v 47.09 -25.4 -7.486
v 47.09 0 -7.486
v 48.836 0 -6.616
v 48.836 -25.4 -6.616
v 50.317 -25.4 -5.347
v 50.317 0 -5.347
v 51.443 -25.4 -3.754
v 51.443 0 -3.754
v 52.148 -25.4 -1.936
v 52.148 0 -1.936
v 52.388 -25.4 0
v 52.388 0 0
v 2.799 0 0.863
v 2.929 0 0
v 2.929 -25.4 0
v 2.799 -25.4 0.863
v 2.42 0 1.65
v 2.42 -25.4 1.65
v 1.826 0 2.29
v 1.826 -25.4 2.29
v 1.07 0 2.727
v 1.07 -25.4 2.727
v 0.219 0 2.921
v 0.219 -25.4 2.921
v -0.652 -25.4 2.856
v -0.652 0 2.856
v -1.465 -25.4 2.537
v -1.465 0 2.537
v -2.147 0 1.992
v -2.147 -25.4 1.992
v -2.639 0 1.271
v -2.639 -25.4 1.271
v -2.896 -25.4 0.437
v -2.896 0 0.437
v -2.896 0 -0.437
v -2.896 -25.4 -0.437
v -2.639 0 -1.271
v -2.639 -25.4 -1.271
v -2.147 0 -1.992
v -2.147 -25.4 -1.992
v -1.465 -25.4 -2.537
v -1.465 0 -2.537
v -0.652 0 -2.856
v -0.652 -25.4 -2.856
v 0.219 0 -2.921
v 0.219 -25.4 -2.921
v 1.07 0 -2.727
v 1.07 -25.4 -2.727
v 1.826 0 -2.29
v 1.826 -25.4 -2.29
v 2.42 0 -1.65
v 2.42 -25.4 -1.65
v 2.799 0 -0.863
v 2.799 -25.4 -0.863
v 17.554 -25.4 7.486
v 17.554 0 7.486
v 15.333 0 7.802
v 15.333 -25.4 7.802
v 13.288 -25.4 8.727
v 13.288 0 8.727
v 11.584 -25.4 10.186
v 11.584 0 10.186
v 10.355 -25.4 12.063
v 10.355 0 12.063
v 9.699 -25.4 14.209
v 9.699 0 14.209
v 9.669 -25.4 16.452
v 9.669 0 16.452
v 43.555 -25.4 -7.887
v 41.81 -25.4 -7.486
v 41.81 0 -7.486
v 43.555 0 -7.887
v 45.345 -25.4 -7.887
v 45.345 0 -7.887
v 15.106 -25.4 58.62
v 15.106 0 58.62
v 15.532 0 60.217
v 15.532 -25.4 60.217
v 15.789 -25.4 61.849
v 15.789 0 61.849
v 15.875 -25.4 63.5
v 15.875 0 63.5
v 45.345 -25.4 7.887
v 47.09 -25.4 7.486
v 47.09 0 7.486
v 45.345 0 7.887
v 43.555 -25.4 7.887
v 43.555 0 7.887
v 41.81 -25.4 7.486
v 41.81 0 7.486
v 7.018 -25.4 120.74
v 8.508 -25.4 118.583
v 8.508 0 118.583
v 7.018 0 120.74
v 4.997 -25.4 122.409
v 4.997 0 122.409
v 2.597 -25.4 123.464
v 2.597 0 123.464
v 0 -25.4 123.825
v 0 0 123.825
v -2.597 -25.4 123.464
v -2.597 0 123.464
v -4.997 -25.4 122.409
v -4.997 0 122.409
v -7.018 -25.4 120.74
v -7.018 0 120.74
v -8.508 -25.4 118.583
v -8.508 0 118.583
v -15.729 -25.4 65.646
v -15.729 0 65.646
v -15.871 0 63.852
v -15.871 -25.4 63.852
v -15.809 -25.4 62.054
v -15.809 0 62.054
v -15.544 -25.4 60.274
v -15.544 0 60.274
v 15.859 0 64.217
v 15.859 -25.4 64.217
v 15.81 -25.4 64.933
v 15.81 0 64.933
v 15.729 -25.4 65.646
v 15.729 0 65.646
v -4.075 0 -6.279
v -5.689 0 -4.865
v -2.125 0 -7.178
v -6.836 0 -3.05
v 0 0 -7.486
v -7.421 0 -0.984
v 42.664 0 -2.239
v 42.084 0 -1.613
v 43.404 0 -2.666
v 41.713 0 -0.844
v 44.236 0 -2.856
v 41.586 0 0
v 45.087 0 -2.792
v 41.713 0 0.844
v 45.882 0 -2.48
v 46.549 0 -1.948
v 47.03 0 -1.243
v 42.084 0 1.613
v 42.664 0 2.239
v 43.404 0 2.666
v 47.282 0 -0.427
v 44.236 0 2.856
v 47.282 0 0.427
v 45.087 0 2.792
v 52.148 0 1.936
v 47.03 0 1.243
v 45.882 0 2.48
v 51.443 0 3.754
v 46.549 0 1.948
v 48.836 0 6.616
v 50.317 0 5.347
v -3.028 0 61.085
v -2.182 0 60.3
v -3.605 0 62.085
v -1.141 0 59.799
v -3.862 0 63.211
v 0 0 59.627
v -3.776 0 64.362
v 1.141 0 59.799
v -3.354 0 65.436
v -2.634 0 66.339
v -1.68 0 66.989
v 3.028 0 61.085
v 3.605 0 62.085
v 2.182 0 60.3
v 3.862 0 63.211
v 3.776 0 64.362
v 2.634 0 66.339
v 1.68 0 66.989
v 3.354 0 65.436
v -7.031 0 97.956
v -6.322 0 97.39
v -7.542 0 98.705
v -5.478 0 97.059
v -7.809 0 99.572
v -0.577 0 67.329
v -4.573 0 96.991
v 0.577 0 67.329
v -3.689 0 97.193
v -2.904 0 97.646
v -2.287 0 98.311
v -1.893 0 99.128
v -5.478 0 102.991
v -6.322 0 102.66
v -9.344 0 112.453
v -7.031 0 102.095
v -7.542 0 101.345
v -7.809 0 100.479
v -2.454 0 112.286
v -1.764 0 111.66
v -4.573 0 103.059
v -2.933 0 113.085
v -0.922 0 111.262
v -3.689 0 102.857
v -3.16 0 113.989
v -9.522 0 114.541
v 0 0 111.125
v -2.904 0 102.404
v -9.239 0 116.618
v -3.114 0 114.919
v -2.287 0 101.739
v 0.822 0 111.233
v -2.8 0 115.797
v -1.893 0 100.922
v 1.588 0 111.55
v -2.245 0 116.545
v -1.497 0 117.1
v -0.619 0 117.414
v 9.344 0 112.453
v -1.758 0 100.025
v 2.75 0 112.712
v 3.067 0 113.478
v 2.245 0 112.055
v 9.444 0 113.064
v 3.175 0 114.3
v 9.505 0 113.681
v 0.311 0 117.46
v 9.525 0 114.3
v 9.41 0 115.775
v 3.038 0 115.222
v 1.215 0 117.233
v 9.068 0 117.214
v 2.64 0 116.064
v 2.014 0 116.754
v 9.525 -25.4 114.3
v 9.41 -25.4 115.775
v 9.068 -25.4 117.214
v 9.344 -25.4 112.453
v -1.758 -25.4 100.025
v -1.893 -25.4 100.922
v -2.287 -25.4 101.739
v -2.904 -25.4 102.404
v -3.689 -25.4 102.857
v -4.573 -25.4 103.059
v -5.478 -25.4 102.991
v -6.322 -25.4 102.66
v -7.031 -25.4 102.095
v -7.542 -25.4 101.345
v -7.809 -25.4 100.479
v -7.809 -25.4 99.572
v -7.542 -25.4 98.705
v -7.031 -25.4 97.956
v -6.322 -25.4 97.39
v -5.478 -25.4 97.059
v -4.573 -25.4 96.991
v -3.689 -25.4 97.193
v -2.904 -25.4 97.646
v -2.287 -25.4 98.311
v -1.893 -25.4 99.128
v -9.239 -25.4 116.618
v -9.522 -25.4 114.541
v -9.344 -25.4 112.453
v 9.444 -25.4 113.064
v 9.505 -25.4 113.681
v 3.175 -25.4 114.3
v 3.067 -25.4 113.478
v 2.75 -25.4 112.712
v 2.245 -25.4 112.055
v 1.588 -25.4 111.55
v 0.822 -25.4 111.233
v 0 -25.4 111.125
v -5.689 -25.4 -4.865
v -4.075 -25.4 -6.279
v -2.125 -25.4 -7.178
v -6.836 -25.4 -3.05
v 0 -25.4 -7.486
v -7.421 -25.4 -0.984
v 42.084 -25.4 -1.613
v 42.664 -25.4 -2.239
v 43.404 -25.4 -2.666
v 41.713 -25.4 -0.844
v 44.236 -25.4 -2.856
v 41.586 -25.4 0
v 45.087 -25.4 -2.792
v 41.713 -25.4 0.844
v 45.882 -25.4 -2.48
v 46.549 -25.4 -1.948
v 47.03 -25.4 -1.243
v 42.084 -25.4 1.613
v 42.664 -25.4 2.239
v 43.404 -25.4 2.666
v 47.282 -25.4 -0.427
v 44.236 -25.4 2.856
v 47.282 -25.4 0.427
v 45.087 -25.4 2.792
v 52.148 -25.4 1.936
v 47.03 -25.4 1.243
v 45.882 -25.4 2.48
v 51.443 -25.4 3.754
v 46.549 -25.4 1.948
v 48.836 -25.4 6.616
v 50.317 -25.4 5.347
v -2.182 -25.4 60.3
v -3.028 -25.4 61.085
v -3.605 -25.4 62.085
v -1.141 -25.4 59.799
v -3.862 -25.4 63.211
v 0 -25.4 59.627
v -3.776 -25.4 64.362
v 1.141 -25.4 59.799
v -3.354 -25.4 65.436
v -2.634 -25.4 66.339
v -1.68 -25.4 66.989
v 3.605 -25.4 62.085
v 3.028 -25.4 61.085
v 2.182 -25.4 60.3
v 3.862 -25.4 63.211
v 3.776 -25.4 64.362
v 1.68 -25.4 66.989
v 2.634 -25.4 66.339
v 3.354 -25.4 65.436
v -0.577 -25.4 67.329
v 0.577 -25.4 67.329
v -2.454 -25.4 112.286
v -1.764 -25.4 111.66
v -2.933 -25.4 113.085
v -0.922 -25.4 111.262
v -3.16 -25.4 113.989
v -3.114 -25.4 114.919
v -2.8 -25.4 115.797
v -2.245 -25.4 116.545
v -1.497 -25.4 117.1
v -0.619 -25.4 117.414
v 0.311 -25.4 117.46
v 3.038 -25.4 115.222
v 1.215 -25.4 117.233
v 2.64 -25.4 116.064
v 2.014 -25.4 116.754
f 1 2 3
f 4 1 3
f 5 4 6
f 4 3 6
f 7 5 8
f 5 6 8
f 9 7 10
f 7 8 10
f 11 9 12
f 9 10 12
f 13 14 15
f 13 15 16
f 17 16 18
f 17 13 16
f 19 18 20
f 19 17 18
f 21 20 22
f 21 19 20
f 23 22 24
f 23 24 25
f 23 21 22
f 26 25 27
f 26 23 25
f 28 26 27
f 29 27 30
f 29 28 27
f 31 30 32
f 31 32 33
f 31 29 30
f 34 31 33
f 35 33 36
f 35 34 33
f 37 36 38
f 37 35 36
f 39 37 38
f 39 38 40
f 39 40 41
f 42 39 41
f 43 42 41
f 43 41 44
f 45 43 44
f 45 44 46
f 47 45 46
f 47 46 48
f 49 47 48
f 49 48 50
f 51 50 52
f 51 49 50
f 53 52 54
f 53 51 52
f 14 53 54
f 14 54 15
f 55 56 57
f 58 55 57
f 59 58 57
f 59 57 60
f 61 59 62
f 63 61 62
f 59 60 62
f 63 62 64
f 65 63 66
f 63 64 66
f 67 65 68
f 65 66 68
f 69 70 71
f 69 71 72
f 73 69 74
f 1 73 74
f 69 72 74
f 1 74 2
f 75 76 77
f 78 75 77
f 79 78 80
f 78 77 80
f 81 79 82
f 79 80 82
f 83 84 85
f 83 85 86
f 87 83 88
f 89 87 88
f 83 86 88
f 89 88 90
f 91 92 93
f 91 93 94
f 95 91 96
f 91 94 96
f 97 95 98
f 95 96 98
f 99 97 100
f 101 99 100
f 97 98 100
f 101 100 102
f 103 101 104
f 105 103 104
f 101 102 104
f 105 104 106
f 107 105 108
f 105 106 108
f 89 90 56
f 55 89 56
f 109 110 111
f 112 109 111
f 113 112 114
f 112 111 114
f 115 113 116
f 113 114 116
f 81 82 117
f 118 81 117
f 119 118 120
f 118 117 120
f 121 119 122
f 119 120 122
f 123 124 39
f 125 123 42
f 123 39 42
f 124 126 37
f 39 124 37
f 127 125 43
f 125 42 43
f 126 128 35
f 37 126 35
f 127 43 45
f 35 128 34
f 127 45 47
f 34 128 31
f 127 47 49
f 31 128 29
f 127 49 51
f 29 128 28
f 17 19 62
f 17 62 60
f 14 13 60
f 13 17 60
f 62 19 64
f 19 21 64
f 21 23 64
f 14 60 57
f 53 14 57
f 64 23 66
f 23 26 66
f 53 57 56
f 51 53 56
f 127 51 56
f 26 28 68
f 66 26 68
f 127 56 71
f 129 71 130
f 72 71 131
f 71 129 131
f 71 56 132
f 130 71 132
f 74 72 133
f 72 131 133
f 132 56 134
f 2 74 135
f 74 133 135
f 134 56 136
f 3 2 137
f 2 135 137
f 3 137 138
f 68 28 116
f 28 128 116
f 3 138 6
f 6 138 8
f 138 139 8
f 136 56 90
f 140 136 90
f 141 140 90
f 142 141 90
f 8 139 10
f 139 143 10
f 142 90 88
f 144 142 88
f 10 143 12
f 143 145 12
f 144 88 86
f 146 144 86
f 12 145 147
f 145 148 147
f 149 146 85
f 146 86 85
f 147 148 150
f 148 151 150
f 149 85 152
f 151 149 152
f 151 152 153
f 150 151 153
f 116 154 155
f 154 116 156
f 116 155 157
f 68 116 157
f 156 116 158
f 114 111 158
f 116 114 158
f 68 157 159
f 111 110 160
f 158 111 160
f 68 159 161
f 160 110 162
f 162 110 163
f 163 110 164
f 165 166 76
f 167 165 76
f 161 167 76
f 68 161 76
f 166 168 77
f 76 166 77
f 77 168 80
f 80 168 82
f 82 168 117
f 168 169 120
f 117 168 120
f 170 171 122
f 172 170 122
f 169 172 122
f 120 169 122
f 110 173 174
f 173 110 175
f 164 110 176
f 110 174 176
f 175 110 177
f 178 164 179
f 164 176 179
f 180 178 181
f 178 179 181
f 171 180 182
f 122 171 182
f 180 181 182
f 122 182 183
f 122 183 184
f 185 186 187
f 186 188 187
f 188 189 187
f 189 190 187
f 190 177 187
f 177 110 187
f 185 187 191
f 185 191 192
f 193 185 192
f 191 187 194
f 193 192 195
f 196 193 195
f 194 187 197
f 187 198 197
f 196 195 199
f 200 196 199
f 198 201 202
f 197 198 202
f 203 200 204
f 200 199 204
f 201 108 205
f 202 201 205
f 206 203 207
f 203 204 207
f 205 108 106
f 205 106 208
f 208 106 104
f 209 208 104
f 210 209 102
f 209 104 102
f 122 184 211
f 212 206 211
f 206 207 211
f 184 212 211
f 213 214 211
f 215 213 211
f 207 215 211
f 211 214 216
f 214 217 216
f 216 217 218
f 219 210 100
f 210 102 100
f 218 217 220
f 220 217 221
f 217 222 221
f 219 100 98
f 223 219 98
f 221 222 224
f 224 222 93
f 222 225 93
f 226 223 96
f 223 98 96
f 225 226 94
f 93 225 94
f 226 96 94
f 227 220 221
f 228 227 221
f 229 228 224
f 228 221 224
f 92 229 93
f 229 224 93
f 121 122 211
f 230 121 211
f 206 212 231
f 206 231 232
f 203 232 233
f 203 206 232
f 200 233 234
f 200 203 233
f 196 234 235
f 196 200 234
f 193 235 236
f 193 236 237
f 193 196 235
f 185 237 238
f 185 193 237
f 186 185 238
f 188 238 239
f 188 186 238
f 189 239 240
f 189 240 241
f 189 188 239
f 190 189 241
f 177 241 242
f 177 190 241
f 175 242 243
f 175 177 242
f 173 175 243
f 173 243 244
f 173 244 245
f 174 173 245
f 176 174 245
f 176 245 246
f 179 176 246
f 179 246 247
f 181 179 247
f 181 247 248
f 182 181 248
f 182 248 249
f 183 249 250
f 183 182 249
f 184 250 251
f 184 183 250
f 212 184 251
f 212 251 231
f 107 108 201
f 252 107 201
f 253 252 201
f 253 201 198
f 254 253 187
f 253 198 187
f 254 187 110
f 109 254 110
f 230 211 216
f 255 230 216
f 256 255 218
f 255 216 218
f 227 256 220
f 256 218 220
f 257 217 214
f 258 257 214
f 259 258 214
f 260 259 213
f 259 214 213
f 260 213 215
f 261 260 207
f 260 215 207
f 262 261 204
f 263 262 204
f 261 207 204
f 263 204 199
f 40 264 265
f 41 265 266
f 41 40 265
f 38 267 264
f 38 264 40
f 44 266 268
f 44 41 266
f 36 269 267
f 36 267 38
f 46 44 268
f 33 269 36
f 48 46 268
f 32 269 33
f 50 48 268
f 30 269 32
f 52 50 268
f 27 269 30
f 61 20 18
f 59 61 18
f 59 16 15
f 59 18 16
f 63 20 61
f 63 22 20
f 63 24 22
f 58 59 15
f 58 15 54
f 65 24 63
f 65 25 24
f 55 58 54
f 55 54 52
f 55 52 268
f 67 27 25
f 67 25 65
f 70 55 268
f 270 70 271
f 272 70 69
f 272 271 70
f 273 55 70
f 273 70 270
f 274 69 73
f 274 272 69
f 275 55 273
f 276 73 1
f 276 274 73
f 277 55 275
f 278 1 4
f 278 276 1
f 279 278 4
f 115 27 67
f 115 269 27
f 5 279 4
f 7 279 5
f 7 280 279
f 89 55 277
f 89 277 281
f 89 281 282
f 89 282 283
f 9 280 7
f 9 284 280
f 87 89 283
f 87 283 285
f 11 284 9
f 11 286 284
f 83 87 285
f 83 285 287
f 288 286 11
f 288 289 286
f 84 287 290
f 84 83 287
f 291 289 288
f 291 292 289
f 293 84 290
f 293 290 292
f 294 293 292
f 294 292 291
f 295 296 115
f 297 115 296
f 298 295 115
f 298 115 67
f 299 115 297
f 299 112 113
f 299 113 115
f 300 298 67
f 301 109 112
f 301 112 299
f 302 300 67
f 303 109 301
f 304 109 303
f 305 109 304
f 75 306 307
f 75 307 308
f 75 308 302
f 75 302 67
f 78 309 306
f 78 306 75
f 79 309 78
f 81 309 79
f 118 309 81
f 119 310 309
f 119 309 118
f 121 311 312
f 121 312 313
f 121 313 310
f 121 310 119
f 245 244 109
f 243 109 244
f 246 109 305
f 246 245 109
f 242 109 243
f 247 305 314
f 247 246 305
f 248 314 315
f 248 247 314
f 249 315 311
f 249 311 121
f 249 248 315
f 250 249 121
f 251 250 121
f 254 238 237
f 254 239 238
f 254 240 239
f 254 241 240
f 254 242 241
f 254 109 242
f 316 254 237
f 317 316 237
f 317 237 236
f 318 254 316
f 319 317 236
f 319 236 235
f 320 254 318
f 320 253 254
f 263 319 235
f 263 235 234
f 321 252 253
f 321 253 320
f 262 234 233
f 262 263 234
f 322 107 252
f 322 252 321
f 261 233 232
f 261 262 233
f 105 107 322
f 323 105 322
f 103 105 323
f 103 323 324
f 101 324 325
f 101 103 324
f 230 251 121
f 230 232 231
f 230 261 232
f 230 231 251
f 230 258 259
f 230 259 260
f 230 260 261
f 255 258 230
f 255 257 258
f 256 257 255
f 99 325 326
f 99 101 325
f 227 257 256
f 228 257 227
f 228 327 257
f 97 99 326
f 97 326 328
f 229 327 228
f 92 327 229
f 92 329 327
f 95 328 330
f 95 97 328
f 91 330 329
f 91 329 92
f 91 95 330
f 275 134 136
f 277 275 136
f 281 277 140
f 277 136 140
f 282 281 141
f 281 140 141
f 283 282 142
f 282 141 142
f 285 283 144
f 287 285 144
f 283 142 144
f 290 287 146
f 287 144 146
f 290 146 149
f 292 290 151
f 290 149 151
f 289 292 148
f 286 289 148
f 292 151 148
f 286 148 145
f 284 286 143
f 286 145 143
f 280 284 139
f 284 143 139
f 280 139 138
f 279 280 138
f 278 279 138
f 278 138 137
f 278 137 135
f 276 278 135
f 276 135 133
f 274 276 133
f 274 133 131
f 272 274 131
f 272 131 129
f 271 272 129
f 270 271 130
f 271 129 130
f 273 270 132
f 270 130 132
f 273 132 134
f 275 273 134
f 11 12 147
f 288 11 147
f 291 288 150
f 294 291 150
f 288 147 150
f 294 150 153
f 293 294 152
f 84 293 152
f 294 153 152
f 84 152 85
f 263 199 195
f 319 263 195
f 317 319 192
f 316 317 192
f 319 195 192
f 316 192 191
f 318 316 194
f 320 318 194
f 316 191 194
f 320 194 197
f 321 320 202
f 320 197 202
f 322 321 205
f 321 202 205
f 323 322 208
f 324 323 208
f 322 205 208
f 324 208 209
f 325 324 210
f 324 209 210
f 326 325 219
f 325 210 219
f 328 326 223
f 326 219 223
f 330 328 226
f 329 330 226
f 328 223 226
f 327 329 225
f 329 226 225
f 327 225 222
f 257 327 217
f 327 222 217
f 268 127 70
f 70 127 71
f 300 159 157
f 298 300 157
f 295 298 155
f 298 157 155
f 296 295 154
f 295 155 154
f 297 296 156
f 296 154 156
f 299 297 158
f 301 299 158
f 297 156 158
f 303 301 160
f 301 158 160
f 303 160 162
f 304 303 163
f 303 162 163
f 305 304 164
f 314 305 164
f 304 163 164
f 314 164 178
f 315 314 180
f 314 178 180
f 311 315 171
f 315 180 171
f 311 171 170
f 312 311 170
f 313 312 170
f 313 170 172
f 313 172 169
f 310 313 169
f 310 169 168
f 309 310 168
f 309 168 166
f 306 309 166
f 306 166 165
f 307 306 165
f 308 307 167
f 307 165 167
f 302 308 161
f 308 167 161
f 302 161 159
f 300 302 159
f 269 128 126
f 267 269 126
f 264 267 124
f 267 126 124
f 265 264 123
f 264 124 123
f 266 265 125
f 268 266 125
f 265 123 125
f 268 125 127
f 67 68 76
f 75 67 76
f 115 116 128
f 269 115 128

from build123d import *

# Parameters (mm, degrees)
F0_R     = 3.0424971204
F0_R_2   = 2.9292036199
F1_DEPTH = 25.4
F2_DEPTH = 25.4


with BuildPart() as f1:
    # F0 (on Front) → F1 (new body)
    with BuildSketch(Plane.XZ):
        with BuildLine():
            ThreePointArc((-9.3441255469, 112.4525848425), (-6.0468585077, 106.9405756212), (0, 104.775))
            ThreePointArc((0, 104.775), (6.0468585077, 106.9405756212), (9.3441255469, 112.4525848425))
            Line((9.3441255469, 112.4525848425), (8.5078797675, 118.5827102238))
            ThreePointArc((8.5078797675, 118.5827102238), (0, 123.825), (-8.5078797675, 118.5827102238))
            Line((-8.5078797675, 118.5827102238), (-9.3441255469, 112.4525848425))
        make_face()
        with BuildLine():
            ThreePointArc((3.175, 114.3), (2.2450640303, 112.0549359697), (0, 111.125))
            ThreePointArc((0, 111.125), (-2.2450640303, 116.5450640303), (3.175, 114.3))
        make_face(mode=Mode.SUBTRACT)
        with BuildLine():
            ThreePointArc((9.3441255469, 112.4525848425), (6.0468585077, 106.9405756212), (0, 104.775))
            Line((0, 104.775), (0, 79.375))
            ThreePointArc((0, 79.375), (10.4391619832, 75.4599131304), (15.7293191148, 65.6457271922))
            Line((15.7293191148, 65.6457271922), (9.3441255469, 112.4525848425))
        make_face()
        with BuildLine():
            Line((0, 79.375), (0, 104.775))
            ThreePointArc((0, 104.775), (-6.0468585077, 106.9405756212), (-9.3441255469, 112.4525848425))
            Line((-9.3441255469, 112.4525848425), (-15.7293191148, 65.6457271922))
            ThreePointArc((-15.7293191148, 65.6457271922), (-10.4391619832, 75.4599131304), (0, 79.375))
        make_face()
        with Locations((-4.8008062877, 100.0252)):
            Circle(F0_R, mode=Mode.SUBTRACT)
        with BuildLine():
            ThreePointArc((15.7293191148, 65.6457271922), (10.4391619832, 75.4599131304), (0, 79.375))
            Line((0, 79.375), (0, 67.372643786))
            ThreePointArc((0, 67.372643786), (2.7383726822, 66.2383726822), (3.872643786, 63.5))
            ThreePointArc((3.872643786, 63.5), (2.7383726822, 60.7616273178), (0, 59.627356214))
            Line((0, 59.627356214), (0, 47.625))
            ThreePointArc((0, 47.625), (9.3418966112, 50.664712987), (15.1062581732, 58.619775722))
            ThreePointArc((15.1062581732, 58.619775722), (15.6816369283, 61.0297999575), (15.875, 63.5))
            ThreePointArc((15.875, 63.5), (15.8385379052, 64.5753334487), (15.7293191148, 65.6457271922))
        make_face()
        with BuildLine():
            Line((0, 67.372643786), (0, 79.375))
            ThreePointArc((0, 79.375), (-10.4391619832, 75.4599131304), (-15.7293191148, 65.6457271922))
            ThreePointArc((-15.7293191148, 65.6457271922), (-15.8655379037, 62.9519744291), (-15.5437709654, 60.2740413558))
            ThreePointArc((-15.5437709654, 60.2740413558), (-10.0200681516, 51.1868420282), (0, 47.625))
            Line((0, 47.625), (0, 59.627356214))
            ThreePointArc((0, 59.627356214), (-3.872643786, 63.5), (0, 67.372643786))
        make_face()
        with BuildLine():
            ThreePointArc((-8.5078797675, 118.5827102238), (-9.4375914689, 115.5874363153), (-9.3441255469, 112.4525848425))
            Line((-9.3441255469, 112.4525848425), (-8.5078797675, 118.5827102238))
        make_face()
        with BuildLine():
            Line((8.5078797675, 118.5827102238), (9.3441255469, 112.4525848425))
            ThreePointArc((9.3441255469, 112.4525848425), (9.4796735396, 113.3718757718), (9.525, 114.3))
            ThreePointArc((9.525, 114.3), (9.2672320513, 116.5009168788), (8.5078797675, 118.5827102238))
        make_face()
        with BuildLine():
            ThreePointArc((0, 47.625), (-10.0200681516, 51.1868420282), (-15.5437709654, 60.2740413558))
            Line((-15.5437709654, 60.2740413558), (-7.420620187, -0.9840145232))
            ThreePointArc((-7.420620187, -0.9840145232), (-5.6302667211, 4.9329489345), (0, 7.4855787045))
            Line((0, 7.4855787045), (0, 47.625))
        make_face()
        with BuildLine():
            ThreePointArc((15.1062581732, 58.619775722), (9.3418966112, 50.664712987), (0, 47.625))
            Line((0, 47.625), (0, 7.4855787045))
            ThreePointArc((0, 7.4855787045), (5.2931034631, 5.2931034631), (7.4855787045, 0))
            Line((7.4855787045, 0), (36.5125, 0))
            ThreePointArc((36.5125, 0), (37.9708204922, 4.5852087364), (41.8099208897, 7.4855787045))
            Line((41.8099208897, 7.4855787045), (17.5539337581, 7.4855787045))
            ThreePointArc((17.5539337581, 7.4855787045), (11.5836409382, 10.1858945453), (9.6690137055, 16.4524968587))
            Line((9.6690137055, 16.4524968587), (15.1062581732, 58.619775722))
        make_face()
        with BuildLine():
            ThreePointArc((0, 7.4855787045), (-5.6302667211, 4.9329489345), (-7.420620187, -0.9840145232))
            ThreePointArc((-7.420620187, -0.9840145232), (-4.9329489345, -5.6302667211), (0, -7.4855787045))
            ThreePointArc((0, -7.4855787045), (5.2931034631, -5.2931034631), (7.4855787045, 0))
            ThreePointArc((7.4855787045, 0), (5.2931034631, 5.2931034631), (0, 7.4855787045))
        make_face()
        Circle(F0_R_2, mode=Mode.SUBTRACT)
        with BuildLine():
            ThreePointArc((7.4855787045, 0), (5.2931034631, -5.2931034631), (0, -7.4855787045))
            Line((0, -7.4855787045), (41.8099208897, -7.4855787045))
            ThreePointArc((41.8099208897, -7.4855787045), (37.9708204922, -4.5852087364), (36.5125, 0))
            Line((36.5125, 0), (7.4855787045, 0))
        make_face()
        with BuildLine():
            Line((47.0900791103, -7.4855787045), (41.8099208897, -7.4855787045))
            ThreePointArc((41.8099208897, -7.4855787045), (44.45, -7.9375), (47.0900791103, -7.4855787045))
        make_face()
        with BuildLine():
            ThreePointArc((36.5125, 0), (37.9708204922, -4.5852087364), (41.8099208897, -7.4855787045))
            Line((41.8099208897, -7.4855787045), (47.0900791103, -7.4855787045))
            ThreePointArc((47.0900791103, -7.4855787045), (50.9291795078, -4.5852087364), (52.3875, 0))
            ThreePointArc((52.3875, 0), (50.9291795078, 4.5852087364), (47.0900791103, 7.4855787045))
            Line((47.0900791103, 7.4855787045), (41.8099208897, 7.4855787045))
            ThreePointArc((41.8099208897, 7.4855787045), (37.9708204922, 4.5852087364), (36.5125, 0))
        make_face()
        with BuildLine():
            ThreePointArc((47.3139235661, 0), (44.45, -2.8639235661), (41.5860764339, 0))
            ThreePointArc((41.5860764339, 0), (44.45, 2.8639235661), (47.3139235661, 0))
        make_face(mode=Mode.SUBTRACT)
        with BuildLine():
            ThreePointArc((47.0900791103, 7.4855787045), (44.45, 7.9375), (41.8099208897, 7.4855787045))
            Line((41.8099208897, 7.4855787045), (47.0900791103, 7.4855787045))
        make_face()
    extrude(amount=F1_DEPTH)

    # F0 (on Front) → F2 (join)
    with BuildSketch(Plane.XZ):
        with BuildLine():
            ThreePointArc((-9.3441255469, 112.4525848425), (-6.0468585077, 106.9405756212), (0, 104.775))
            ThreePointArc((0, 104.775), (6.0468585077, 106.9405756212), (9.3441255469, 112.4525848425))
            Line((9.3441255469, 112.4525848425), (8.5078797675, 118.5827102238))
            ThreePointArc((8.5078797675, 118.5827102238), (0, 123.825), (-8.5078797675, 118.5827102238))
            Line((-8.5078797675, 118.5827102238), (-9.3441255469, 112.4525848425))
        make_face()
        with BuildLine():
            ThreePointArc((3.175, 114.3), (2.2450640303, 112.0549359697), (0, 111.125))
            ThreePointArc((0, 111.125), (-2.2450640303, 116.5450640303), (3.175, 114.3))
        make_face(mode=Mode.SUBTRACT)
        with BuildLine():
            ThreePointArc((9.3441255469, 112.4525848425), (6.0468585077, 106.9405756212), (0, 104.775))
            Line((0, 104.775), (0, 79.375))
            ThreePointArc((0, 79.375), (10.4391619832, 75.4599131304), (15.7293191148, 65.6457271922))
            Line((15.7293191148, 65.6457271922), (9.3441255469, 112.4525848425))
        make_face()
        with BuildLine():
            Line((0, 79.375), (0, 104.775))
            ThreePointArc((0, 104.775), (-6.0468585077, 106.9405756212), (-9.3441255469, 112.4525848425))
            Line((-9.3441255469, 112.4525848425), (-15.7293191148, 65.6457271922))
            ThreePointArc((-15.7293191148, 65.6457271922), (-10.4391619832, 75.4599131304), (0, 79.375))
        make_face()
        with Locations((-4.8008062877, 100.0252)):
            Circle(F0_R, mode=Mode.SUBTRACT)
        with BuildLine():
            ThreePointArc((15.7293191148, 65.6457271922), (10.4391619832, 75.4599131304), (0, 79.375))
            Line((0, 79.375), (0, 67.372643786))
            ThreePointArc((0, 67.372643786), (2.7383726822, 66.2383726822), (3.872643786, 63.5))
            ThreePointArc((3.872643786, 63.5), (2.7383726822, 60.7616273178), (0, 59.627356214))
            Line((0, 59.627356214), (0, 47.625))
            ThreePointArc((0, 47.625), (9.3418966112, 50.664712987), (15.1062581732, 58.619775722))
            ThreePointArc((15.1062581732, 58.619775722), (15.6816369283, 61.0297999575), (15.875, 63.5))
            ThreePointArc((15.875, 63.5), (15.8385379052, 64.5753334487), (15.7293191148, 65.6457271922))
        make_face()
        with BuildLine():
            Line((0, 67.372643786), (0, 79.375))
            ThreePointArc((0, 79.375), (-10.4391619832, 75.4599131304), (-15.7293191148, 65.6457271922))
            ThreePointArc((-15.7293191148, 65.6457271922), (-15.8655379037, 62.9519744291), (-15.5437709654, 60.2740413558))
            ThreePointArc((-15.5437709654, 60.2740413558), (-10.0200681516, 51.1868420282), (0, 47.625))
            Line((0, 47.625), (0, 59.627356214))
            ThreePointArc((0, 59.627356214), (-3.872643786, 63.5), (0, 67.372643786))
        make_face()
        with BuildLine():
            ThreePointArc((-8.5078797675, 118.5827102238), (-9.4375914689, 115.5874363153), (-9.3441255469, 112.4525848425))
            Line((-9.3441255469, 112.4525848425), (-8.5078797675, 118.5827102238))
        make_face()
        with BuildLine():
            Line((8.5078797675, 118.5827102238), (9.3441255469, 112.4525848425))
            ThreePointArc((9.3441255469, 112.4525848425), (9.4796735396, 113.3718757718), (9.525, 114.3))
            ThreePointArc((9.525, 114.3), (9.2672320513, 116.5009168788), (8.5078797675, 118.5827102238))
        make_face()
        with BuildLine():
            ThreePointArc((0, 47.625), (-10.0200681516, 51.1868420282), (-15.5437709654, 60.2740413558))
            Line((-15.5437709654, 60.2740413558), (-7.420620187, -0.9840145232))
            ThreePointArc((-7.420620187, -0.9840145232), (-5.6302667211, 4.9329489345), (0, 7.4855787045))
            Line((0, 7.4855787045), (0, 47.625))
        make_face()
        with BuildLine():
            ThreePointArc((15.1062581732, 58.619775722), (9.3418966112, 50.664712987), (0, 47.625))
            Line((0, 47.625), (0, 7.4855787045))
            ThreePointArc((0, 7.4855787045), (5.2931034631, 5.2931034631), (7.4855787045, 0))
            Line((7.4855787045, 0), (36.5125, 0))
            ThreePointArc((36.5125, 0), (37.9708204922, 4.5852087364), (41.8099208897, 7.4855787045))
            Line((41.8099208897, 7.4855787045), (17.5539337581, 7.4855787045))
            ThreePointArc((17.5539337581, 7.4855787045), (11.5836409382, 10.1858945453), (9.6690137055, 16.4524968587))
            Line((9.6690137055, 16.4524968587), (15.1062581732, 58.619775722))
        make_face()
        with BuildLine():
            ThreePointArc((0, 7.4855787045), (-5.6302667211, 4.9329489345), (-7.420620187, -0.9840145232))
            ThreePointArc((-7.420620187, -0.9840145232), (-4.9329489345, -5.6302667211), (0, -7.4855787045))
            ThreePointArc((0, -7.4855787045), (5.2931034631, -5.2931034631), (7.4855787045, 0))
            ThreePointArc((7.4855787045, 0), (5.2931034631, 5.2931034631), (0, 7.4855787045))
        make_face()
        Circle(F0_R_2, mode=Mode.SUBTRACT)
        with BuildLine():
            ThreePointArc((7.4855787045, 0), (5.2931034631, -5.2931034631), (0, -7.4855787045))
            Line((0, -7.4855787045), (41.8099208897, -7.4855787045))
            ThreePointArc((41.8099208897, -7.4855787045), (37.9708204922, -4.5852087364), (36.5125, 0))
            Line((36.5125, 0), (7.4855787045, 0))
        make_face()
        with BuildLine():
            Line((47.0900791103, -7.4855787045), (41.8099208897, -7.4855787045))
            ThreePointArc((41.8099208897, -7.4855787045), (44.45, -7.9375), (47.0900791103, -7.4855787045))
        make_face()
        with BuildLine():
            ThreePointArc((36.5125, 0), (37.9708204922, -4.5852087364), (41.8099208897, -7.4855787045))
            Line((41.8099208897, -7.4855787045), (47.0900791103, -7.4855787045))
            ThreePointArc((47.0900791103, -7.4855787045), (50.9291795078, -4.5852087364), (52.3875, 0))
            ThreePointArc((52.3875, 0), (50.9291795078, 4.5852087364), (47.0900791103, 7.4855787045))
            Line((47.0900791103, 7.4855787045), (41.8099208897, 7.4855787045))
            ThreePointArc((41.8099208897, 7.4855787045), (37.9708204922, 4.5852087364), (36.5125, 0))
        make_face()
        with BuildLine():
            ThreePointArc((47.3139235661, 0), (44.45, -2.8639235661), (41.5860764339, 0))
            ThreePointArc((41.5860764339, 0), (44.45, 2.8639235661), (47.3139235661, 0))
        make_face(mode=Mode.SUBTRACT)
        with BuildLine():
            ThreePointArc((47.0900791103, 7.4855787045), (44.45, 7.9375), (41.8099208897, 7.4855787045))
            Line((41.8099208897, 7.4855787045), (47.0900791103, 7.4855787045))
        make_face()
    extrude(amount=F2_DEPTH)


solid = f1.part
